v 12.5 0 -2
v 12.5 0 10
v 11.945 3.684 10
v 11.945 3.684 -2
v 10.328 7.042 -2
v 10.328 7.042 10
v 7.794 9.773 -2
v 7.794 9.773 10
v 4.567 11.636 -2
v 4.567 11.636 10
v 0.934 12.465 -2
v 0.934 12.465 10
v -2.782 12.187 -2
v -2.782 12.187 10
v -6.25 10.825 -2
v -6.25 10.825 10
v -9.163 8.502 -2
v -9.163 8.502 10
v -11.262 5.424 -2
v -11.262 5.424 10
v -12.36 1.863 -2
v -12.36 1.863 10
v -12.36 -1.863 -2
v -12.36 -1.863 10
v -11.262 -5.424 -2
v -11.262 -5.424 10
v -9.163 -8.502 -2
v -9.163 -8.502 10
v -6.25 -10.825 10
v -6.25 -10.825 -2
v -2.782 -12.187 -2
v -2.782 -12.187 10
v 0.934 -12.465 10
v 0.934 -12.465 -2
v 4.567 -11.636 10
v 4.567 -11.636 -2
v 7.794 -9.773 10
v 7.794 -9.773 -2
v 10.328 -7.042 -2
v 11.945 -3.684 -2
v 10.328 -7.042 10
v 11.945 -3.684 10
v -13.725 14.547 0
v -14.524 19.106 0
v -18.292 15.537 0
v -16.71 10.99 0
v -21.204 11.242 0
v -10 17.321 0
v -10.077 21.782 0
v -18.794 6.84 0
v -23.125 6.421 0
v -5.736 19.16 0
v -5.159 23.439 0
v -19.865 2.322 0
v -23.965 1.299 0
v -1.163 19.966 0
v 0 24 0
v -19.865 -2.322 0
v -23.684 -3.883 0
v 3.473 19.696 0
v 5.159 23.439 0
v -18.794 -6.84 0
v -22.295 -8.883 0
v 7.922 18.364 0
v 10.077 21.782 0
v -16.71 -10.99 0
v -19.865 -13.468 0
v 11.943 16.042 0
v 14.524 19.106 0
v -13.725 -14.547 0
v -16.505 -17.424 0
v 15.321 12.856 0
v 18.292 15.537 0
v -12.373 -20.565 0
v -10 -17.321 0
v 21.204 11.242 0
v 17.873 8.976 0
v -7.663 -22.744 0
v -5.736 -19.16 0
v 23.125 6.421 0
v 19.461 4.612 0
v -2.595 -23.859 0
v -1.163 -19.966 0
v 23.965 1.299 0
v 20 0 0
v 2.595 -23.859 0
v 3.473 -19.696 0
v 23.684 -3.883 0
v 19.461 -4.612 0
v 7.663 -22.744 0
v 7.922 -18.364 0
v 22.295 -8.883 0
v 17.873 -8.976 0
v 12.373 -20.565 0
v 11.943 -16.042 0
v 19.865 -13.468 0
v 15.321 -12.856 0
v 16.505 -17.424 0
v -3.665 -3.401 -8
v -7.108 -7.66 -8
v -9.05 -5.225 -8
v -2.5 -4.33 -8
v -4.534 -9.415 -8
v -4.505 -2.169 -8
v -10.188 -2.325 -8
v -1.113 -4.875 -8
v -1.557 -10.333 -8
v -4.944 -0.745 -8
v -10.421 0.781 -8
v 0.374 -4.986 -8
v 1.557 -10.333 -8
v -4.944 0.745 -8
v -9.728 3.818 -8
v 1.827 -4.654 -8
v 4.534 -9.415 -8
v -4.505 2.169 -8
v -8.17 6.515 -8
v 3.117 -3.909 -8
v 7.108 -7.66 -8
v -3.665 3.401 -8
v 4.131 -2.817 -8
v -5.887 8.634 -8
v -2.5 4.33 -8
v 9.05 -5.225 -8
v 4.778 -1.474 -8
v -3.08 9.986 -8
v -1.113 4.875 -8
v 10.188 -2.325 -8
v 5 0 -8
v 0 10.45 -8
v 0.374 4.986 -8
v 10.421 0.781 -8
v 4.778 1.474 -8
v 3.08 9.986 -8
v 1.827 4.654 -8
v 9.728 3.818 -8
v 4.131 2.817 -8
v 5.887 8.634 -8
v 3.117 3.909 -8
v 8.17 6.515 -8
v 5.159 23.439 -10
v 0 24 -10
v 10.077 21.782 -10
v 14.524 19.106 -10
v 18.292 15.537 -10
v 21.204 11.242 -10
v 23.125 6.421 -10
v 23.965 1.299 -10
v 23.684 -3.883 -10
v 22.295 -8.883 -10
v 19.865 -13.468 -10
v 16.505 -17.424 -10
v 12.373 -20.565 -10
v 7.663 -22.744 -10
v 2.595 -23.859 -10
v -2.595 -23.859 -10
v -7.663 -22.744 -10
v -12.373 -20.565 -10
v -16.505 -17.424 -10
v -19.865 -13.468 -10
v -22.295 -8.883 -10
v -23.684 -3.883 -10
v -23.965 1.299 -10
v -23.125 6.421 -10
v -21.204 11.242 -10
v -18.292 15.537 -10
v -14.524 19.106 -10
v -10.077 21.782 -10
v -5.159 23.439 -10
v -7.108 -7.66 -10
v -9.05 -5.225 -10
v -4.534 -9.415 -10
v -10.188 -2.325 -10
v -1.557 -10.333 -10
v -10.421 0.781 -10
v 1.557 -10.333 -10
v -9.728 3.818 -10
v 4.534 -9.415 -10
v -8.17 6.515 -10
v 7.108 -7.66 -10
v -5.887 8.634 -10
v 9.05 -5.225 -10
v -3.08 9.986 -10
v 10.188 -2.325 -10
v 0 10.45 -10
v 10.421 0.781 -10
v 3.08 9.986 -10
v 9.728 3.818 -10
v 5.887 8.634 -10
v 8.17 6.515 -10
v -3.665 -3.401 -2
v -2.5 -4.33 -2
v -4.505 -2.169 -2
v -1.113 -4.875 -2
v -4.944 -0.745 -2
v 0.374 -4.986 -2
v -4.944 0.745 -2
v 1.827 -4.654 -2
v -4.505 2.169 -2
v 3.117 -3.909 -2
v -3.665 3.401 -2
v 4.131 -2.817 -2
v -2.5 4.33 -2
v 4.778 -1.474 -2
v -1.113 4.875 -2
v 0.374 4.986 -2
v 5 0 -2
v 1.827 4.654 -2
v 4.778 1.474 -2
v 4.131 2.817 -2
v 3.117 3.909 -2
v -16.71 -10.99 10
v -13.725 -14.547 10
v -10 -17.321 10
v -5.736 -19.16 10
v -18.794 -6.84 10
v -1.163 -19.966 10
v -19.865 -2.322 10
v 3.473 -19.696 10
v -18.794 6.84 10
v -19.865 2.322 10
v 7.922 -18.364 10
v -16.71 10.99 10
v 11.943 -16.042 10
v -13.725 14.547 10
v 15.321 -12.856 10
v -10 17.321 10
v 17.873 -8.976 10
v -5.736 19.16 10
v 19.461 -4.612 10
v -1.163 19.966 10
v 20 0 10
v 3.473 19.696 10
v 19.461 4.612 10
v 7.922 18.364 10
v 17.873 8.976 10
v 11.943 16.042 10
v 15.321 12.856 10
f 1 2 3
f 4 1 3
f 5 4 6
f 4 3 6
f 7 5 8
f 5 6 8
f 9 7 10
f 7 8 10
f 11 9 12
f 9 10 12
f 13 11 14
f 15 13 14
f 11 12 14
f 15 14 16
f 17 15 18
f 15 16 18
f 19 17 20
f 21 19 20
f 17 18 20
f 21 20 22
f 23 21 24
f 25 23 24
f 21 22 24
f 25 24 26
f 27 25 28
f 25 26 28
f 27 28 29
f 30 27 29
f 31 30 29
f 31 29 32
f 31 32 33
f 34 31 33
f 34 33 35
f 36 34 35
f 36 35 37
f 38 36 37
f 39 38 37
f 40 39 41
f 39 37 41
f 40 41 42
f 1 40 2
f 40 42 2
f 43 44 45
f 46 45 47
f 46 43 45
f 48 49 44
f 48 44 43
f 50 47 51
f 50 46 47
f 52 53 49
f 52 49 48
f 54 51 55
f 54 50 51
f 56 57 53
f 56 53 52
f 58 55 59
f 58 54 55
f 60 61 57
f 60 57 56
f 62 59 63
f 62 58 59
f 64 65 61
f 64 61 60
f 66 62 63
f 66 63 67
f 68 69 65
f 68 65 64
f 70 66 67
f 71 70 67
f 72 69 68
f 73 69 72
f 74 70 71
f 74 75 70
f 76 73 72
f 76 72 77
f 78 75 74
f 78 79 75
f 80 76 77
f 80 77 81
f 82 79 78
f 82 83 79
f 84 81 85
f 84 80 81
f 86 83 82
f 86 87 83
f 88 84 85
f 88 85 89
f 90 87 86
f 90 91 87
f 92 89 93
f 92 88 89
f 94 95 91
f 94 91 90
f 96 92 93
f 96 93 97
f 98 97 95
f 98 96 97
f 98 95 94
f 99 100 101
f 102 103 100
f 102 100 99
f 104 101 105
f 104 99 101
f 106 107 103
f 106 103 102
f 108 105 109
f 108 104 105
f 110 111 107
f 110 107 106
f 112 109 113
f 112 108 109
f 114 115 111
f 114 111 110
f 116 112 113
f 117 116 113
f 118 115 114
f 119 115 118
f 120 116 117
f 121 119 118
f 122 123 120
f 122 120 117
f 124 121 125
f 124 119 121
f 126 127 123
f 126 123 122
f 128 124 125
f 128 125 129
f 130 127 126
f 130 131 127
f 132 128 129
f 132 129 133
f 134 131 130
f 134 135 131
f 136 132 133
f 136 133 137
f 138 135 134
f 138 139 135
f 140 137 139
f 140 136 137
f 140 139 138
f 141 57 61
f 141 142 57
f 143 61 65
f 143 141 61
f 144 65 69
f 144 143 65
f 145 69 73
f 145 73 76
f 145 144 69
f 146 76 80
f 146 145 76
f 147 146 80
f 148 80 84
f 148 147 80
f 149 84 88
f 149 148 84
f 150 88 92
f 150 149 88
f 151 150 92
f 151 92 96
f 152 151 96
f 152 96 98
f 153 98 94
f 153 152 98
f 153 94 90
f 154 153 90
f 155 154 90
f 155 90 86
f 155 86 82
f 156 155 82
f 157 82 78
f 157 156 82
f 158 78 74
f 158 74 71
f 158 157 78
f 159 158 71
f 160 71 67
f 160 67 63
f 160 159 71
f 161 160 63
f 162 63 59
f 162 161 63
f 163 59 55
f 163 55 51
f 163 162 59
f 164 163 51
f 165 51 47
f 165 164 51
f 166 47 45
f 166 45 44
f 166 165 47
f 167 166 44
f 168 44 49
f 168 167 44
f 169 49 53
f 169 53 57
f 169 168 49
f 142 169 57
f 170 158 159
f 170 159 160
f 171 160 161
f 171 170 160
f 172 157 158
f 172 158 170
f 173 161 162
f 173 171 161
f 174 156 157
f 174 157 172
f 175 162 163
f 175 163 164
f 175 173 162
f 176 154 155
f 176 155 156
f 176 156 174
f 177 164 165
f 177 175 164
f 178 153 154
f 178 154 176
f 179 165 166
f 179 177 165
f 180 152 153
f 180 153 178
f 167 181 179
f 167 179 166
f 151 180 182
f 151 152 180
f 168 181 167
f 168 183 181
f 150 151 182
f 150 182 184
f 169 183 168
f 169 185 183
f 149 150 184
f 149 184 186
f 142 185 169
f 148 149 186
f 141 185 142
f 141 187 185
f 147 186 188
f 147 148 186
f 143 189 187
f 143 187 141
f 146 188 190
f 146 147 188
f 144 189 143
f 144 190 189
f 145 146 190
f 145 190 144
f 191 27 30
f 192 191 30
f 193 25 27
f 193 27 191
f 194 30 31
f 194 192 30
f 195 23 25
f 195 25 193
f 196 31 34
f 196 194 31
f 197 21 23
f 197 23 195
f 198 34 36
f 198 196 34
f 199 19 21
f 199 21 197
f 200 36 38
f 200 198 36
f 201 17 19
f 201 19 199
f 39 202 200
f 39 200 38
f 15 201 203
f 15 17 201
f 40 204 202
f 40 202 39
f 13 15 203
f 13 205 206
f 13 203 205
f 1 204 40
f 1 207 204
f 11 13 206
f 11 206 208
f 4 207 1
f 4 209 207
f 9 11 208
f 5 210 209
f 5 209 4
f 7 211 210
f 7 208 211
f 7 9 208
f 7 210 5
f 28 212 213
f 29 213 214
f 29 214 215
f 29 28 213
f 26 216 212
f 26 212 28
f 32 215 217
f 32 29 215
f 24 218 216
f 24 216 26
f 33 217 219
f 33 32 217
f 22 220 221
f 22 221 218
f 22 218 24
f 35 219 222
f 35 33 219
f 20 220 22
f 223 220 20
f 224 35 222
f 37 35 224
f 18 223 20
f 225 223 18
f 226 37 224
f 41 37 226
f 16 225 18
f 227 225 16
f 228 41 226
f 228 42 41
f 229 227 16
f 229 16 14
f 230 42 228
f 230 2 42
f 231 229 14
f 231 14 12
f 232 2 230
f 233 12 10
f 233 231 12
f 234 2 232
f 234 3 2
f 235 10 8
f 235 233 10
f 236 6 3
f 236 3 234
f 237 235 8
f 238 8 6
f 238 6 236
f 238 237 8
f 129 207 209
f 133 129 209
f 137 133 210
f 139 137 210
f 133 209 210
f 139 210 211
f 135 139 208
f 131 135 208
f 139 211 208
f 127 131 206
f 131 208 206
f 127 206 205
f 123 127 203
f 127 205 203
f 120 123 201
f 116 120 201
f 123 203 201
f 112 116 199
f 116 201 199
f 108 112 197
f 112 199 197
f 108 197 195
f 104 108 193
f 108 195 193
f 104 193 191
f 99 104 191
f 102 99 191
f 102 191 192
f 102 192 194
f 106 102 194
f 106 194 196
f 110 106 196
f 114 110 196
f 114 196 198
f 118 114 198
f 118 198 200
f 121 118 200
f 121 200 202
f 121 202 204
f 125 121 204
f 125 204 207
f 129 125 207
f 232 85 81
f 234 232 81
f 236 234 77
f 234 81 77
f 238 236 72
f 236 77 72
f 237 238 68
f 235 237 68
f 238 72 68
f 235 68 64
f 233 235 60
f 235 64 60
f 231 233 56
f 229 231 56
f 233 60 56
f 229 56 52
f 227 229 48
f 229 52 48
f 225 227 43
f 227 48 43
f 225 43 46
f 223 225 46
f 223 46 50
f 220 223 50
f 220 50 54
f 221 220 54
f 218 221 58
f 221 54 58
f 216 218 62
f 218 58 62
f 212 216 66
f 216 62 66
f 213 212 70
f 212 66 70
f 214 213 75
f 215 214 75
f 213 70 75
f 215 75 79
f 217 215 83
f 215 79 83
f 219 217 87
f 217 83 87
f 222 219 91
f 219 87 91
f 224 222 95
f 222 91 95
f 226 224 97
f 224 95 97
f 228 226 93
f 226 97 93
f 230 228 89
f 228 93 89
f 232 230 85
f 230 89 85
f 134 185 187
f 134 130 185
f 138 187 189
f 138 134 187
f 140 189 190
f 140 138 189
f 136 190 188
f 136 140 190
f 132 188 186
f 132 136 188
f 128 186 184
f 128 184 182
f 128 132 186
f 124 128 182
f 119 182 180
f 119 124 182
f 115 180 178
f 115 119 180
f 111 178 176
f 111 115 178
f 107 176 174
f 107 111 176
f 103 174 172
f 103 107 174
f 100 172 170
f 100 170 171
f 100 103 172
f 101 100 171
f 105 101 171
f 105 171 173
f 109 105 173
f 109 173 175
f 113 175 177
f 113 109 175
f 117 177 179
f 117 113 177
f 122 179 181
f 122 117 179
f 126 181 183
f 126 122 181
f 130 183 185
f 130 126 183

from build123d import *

# Parameters (mm, degrees)
SKETCH_2_R          = 20
EXTRUDE_1_DEPTH     = 10
SKETCH_3_R          = 5
CUT_EXTRUDE_1_DEPTH = 21
SKETCH_4_R          = 12.5
CUT_EXTRUDE_2_DEPTH = 12


with BuildPart() as part:
    # 草图1 → 旋转1 (revolve)
    with BuildSketch(Plane(origin=(0, 0, 0), x_dir=(0, 0, -1), z_dir=(1, 0, 0))):
        Polygon((0, 0), (0, 24), (10, 24), (10, 10.45), (8, 10.45), (8, 0), align=None)
    revolve(axis=Axis((0, 0, 0), (0, 0, -1)))

    # 草图2 → 凸台-拉伸1 (add)
    with BuildSketch(Plane.XY):
        Circle(SKETCH_2_R)
    extrude(amount=EXTRUDE_1_DEPTH)

    # 草图3 → 切除-拉伸1 (cut, through all)
    with BuildSketch(Plane.XY.offset(10)):
        Circle(SKETCH_3_R)
    extrude(amount=-CUT_EXTRUDE_1_DEPTH, mode=Mode.SUBTRACT)

    # 草图4 → 切除-拉伸2 (cut)
    with BuildSketch(Plane.XY.offset(10)):
        Circle(SKETCH_4_R)
    extrude(amount=-CUT_EXTRUDE_2_DEPTH, mode=Mode.SUBTRACT)


solid = part.part
